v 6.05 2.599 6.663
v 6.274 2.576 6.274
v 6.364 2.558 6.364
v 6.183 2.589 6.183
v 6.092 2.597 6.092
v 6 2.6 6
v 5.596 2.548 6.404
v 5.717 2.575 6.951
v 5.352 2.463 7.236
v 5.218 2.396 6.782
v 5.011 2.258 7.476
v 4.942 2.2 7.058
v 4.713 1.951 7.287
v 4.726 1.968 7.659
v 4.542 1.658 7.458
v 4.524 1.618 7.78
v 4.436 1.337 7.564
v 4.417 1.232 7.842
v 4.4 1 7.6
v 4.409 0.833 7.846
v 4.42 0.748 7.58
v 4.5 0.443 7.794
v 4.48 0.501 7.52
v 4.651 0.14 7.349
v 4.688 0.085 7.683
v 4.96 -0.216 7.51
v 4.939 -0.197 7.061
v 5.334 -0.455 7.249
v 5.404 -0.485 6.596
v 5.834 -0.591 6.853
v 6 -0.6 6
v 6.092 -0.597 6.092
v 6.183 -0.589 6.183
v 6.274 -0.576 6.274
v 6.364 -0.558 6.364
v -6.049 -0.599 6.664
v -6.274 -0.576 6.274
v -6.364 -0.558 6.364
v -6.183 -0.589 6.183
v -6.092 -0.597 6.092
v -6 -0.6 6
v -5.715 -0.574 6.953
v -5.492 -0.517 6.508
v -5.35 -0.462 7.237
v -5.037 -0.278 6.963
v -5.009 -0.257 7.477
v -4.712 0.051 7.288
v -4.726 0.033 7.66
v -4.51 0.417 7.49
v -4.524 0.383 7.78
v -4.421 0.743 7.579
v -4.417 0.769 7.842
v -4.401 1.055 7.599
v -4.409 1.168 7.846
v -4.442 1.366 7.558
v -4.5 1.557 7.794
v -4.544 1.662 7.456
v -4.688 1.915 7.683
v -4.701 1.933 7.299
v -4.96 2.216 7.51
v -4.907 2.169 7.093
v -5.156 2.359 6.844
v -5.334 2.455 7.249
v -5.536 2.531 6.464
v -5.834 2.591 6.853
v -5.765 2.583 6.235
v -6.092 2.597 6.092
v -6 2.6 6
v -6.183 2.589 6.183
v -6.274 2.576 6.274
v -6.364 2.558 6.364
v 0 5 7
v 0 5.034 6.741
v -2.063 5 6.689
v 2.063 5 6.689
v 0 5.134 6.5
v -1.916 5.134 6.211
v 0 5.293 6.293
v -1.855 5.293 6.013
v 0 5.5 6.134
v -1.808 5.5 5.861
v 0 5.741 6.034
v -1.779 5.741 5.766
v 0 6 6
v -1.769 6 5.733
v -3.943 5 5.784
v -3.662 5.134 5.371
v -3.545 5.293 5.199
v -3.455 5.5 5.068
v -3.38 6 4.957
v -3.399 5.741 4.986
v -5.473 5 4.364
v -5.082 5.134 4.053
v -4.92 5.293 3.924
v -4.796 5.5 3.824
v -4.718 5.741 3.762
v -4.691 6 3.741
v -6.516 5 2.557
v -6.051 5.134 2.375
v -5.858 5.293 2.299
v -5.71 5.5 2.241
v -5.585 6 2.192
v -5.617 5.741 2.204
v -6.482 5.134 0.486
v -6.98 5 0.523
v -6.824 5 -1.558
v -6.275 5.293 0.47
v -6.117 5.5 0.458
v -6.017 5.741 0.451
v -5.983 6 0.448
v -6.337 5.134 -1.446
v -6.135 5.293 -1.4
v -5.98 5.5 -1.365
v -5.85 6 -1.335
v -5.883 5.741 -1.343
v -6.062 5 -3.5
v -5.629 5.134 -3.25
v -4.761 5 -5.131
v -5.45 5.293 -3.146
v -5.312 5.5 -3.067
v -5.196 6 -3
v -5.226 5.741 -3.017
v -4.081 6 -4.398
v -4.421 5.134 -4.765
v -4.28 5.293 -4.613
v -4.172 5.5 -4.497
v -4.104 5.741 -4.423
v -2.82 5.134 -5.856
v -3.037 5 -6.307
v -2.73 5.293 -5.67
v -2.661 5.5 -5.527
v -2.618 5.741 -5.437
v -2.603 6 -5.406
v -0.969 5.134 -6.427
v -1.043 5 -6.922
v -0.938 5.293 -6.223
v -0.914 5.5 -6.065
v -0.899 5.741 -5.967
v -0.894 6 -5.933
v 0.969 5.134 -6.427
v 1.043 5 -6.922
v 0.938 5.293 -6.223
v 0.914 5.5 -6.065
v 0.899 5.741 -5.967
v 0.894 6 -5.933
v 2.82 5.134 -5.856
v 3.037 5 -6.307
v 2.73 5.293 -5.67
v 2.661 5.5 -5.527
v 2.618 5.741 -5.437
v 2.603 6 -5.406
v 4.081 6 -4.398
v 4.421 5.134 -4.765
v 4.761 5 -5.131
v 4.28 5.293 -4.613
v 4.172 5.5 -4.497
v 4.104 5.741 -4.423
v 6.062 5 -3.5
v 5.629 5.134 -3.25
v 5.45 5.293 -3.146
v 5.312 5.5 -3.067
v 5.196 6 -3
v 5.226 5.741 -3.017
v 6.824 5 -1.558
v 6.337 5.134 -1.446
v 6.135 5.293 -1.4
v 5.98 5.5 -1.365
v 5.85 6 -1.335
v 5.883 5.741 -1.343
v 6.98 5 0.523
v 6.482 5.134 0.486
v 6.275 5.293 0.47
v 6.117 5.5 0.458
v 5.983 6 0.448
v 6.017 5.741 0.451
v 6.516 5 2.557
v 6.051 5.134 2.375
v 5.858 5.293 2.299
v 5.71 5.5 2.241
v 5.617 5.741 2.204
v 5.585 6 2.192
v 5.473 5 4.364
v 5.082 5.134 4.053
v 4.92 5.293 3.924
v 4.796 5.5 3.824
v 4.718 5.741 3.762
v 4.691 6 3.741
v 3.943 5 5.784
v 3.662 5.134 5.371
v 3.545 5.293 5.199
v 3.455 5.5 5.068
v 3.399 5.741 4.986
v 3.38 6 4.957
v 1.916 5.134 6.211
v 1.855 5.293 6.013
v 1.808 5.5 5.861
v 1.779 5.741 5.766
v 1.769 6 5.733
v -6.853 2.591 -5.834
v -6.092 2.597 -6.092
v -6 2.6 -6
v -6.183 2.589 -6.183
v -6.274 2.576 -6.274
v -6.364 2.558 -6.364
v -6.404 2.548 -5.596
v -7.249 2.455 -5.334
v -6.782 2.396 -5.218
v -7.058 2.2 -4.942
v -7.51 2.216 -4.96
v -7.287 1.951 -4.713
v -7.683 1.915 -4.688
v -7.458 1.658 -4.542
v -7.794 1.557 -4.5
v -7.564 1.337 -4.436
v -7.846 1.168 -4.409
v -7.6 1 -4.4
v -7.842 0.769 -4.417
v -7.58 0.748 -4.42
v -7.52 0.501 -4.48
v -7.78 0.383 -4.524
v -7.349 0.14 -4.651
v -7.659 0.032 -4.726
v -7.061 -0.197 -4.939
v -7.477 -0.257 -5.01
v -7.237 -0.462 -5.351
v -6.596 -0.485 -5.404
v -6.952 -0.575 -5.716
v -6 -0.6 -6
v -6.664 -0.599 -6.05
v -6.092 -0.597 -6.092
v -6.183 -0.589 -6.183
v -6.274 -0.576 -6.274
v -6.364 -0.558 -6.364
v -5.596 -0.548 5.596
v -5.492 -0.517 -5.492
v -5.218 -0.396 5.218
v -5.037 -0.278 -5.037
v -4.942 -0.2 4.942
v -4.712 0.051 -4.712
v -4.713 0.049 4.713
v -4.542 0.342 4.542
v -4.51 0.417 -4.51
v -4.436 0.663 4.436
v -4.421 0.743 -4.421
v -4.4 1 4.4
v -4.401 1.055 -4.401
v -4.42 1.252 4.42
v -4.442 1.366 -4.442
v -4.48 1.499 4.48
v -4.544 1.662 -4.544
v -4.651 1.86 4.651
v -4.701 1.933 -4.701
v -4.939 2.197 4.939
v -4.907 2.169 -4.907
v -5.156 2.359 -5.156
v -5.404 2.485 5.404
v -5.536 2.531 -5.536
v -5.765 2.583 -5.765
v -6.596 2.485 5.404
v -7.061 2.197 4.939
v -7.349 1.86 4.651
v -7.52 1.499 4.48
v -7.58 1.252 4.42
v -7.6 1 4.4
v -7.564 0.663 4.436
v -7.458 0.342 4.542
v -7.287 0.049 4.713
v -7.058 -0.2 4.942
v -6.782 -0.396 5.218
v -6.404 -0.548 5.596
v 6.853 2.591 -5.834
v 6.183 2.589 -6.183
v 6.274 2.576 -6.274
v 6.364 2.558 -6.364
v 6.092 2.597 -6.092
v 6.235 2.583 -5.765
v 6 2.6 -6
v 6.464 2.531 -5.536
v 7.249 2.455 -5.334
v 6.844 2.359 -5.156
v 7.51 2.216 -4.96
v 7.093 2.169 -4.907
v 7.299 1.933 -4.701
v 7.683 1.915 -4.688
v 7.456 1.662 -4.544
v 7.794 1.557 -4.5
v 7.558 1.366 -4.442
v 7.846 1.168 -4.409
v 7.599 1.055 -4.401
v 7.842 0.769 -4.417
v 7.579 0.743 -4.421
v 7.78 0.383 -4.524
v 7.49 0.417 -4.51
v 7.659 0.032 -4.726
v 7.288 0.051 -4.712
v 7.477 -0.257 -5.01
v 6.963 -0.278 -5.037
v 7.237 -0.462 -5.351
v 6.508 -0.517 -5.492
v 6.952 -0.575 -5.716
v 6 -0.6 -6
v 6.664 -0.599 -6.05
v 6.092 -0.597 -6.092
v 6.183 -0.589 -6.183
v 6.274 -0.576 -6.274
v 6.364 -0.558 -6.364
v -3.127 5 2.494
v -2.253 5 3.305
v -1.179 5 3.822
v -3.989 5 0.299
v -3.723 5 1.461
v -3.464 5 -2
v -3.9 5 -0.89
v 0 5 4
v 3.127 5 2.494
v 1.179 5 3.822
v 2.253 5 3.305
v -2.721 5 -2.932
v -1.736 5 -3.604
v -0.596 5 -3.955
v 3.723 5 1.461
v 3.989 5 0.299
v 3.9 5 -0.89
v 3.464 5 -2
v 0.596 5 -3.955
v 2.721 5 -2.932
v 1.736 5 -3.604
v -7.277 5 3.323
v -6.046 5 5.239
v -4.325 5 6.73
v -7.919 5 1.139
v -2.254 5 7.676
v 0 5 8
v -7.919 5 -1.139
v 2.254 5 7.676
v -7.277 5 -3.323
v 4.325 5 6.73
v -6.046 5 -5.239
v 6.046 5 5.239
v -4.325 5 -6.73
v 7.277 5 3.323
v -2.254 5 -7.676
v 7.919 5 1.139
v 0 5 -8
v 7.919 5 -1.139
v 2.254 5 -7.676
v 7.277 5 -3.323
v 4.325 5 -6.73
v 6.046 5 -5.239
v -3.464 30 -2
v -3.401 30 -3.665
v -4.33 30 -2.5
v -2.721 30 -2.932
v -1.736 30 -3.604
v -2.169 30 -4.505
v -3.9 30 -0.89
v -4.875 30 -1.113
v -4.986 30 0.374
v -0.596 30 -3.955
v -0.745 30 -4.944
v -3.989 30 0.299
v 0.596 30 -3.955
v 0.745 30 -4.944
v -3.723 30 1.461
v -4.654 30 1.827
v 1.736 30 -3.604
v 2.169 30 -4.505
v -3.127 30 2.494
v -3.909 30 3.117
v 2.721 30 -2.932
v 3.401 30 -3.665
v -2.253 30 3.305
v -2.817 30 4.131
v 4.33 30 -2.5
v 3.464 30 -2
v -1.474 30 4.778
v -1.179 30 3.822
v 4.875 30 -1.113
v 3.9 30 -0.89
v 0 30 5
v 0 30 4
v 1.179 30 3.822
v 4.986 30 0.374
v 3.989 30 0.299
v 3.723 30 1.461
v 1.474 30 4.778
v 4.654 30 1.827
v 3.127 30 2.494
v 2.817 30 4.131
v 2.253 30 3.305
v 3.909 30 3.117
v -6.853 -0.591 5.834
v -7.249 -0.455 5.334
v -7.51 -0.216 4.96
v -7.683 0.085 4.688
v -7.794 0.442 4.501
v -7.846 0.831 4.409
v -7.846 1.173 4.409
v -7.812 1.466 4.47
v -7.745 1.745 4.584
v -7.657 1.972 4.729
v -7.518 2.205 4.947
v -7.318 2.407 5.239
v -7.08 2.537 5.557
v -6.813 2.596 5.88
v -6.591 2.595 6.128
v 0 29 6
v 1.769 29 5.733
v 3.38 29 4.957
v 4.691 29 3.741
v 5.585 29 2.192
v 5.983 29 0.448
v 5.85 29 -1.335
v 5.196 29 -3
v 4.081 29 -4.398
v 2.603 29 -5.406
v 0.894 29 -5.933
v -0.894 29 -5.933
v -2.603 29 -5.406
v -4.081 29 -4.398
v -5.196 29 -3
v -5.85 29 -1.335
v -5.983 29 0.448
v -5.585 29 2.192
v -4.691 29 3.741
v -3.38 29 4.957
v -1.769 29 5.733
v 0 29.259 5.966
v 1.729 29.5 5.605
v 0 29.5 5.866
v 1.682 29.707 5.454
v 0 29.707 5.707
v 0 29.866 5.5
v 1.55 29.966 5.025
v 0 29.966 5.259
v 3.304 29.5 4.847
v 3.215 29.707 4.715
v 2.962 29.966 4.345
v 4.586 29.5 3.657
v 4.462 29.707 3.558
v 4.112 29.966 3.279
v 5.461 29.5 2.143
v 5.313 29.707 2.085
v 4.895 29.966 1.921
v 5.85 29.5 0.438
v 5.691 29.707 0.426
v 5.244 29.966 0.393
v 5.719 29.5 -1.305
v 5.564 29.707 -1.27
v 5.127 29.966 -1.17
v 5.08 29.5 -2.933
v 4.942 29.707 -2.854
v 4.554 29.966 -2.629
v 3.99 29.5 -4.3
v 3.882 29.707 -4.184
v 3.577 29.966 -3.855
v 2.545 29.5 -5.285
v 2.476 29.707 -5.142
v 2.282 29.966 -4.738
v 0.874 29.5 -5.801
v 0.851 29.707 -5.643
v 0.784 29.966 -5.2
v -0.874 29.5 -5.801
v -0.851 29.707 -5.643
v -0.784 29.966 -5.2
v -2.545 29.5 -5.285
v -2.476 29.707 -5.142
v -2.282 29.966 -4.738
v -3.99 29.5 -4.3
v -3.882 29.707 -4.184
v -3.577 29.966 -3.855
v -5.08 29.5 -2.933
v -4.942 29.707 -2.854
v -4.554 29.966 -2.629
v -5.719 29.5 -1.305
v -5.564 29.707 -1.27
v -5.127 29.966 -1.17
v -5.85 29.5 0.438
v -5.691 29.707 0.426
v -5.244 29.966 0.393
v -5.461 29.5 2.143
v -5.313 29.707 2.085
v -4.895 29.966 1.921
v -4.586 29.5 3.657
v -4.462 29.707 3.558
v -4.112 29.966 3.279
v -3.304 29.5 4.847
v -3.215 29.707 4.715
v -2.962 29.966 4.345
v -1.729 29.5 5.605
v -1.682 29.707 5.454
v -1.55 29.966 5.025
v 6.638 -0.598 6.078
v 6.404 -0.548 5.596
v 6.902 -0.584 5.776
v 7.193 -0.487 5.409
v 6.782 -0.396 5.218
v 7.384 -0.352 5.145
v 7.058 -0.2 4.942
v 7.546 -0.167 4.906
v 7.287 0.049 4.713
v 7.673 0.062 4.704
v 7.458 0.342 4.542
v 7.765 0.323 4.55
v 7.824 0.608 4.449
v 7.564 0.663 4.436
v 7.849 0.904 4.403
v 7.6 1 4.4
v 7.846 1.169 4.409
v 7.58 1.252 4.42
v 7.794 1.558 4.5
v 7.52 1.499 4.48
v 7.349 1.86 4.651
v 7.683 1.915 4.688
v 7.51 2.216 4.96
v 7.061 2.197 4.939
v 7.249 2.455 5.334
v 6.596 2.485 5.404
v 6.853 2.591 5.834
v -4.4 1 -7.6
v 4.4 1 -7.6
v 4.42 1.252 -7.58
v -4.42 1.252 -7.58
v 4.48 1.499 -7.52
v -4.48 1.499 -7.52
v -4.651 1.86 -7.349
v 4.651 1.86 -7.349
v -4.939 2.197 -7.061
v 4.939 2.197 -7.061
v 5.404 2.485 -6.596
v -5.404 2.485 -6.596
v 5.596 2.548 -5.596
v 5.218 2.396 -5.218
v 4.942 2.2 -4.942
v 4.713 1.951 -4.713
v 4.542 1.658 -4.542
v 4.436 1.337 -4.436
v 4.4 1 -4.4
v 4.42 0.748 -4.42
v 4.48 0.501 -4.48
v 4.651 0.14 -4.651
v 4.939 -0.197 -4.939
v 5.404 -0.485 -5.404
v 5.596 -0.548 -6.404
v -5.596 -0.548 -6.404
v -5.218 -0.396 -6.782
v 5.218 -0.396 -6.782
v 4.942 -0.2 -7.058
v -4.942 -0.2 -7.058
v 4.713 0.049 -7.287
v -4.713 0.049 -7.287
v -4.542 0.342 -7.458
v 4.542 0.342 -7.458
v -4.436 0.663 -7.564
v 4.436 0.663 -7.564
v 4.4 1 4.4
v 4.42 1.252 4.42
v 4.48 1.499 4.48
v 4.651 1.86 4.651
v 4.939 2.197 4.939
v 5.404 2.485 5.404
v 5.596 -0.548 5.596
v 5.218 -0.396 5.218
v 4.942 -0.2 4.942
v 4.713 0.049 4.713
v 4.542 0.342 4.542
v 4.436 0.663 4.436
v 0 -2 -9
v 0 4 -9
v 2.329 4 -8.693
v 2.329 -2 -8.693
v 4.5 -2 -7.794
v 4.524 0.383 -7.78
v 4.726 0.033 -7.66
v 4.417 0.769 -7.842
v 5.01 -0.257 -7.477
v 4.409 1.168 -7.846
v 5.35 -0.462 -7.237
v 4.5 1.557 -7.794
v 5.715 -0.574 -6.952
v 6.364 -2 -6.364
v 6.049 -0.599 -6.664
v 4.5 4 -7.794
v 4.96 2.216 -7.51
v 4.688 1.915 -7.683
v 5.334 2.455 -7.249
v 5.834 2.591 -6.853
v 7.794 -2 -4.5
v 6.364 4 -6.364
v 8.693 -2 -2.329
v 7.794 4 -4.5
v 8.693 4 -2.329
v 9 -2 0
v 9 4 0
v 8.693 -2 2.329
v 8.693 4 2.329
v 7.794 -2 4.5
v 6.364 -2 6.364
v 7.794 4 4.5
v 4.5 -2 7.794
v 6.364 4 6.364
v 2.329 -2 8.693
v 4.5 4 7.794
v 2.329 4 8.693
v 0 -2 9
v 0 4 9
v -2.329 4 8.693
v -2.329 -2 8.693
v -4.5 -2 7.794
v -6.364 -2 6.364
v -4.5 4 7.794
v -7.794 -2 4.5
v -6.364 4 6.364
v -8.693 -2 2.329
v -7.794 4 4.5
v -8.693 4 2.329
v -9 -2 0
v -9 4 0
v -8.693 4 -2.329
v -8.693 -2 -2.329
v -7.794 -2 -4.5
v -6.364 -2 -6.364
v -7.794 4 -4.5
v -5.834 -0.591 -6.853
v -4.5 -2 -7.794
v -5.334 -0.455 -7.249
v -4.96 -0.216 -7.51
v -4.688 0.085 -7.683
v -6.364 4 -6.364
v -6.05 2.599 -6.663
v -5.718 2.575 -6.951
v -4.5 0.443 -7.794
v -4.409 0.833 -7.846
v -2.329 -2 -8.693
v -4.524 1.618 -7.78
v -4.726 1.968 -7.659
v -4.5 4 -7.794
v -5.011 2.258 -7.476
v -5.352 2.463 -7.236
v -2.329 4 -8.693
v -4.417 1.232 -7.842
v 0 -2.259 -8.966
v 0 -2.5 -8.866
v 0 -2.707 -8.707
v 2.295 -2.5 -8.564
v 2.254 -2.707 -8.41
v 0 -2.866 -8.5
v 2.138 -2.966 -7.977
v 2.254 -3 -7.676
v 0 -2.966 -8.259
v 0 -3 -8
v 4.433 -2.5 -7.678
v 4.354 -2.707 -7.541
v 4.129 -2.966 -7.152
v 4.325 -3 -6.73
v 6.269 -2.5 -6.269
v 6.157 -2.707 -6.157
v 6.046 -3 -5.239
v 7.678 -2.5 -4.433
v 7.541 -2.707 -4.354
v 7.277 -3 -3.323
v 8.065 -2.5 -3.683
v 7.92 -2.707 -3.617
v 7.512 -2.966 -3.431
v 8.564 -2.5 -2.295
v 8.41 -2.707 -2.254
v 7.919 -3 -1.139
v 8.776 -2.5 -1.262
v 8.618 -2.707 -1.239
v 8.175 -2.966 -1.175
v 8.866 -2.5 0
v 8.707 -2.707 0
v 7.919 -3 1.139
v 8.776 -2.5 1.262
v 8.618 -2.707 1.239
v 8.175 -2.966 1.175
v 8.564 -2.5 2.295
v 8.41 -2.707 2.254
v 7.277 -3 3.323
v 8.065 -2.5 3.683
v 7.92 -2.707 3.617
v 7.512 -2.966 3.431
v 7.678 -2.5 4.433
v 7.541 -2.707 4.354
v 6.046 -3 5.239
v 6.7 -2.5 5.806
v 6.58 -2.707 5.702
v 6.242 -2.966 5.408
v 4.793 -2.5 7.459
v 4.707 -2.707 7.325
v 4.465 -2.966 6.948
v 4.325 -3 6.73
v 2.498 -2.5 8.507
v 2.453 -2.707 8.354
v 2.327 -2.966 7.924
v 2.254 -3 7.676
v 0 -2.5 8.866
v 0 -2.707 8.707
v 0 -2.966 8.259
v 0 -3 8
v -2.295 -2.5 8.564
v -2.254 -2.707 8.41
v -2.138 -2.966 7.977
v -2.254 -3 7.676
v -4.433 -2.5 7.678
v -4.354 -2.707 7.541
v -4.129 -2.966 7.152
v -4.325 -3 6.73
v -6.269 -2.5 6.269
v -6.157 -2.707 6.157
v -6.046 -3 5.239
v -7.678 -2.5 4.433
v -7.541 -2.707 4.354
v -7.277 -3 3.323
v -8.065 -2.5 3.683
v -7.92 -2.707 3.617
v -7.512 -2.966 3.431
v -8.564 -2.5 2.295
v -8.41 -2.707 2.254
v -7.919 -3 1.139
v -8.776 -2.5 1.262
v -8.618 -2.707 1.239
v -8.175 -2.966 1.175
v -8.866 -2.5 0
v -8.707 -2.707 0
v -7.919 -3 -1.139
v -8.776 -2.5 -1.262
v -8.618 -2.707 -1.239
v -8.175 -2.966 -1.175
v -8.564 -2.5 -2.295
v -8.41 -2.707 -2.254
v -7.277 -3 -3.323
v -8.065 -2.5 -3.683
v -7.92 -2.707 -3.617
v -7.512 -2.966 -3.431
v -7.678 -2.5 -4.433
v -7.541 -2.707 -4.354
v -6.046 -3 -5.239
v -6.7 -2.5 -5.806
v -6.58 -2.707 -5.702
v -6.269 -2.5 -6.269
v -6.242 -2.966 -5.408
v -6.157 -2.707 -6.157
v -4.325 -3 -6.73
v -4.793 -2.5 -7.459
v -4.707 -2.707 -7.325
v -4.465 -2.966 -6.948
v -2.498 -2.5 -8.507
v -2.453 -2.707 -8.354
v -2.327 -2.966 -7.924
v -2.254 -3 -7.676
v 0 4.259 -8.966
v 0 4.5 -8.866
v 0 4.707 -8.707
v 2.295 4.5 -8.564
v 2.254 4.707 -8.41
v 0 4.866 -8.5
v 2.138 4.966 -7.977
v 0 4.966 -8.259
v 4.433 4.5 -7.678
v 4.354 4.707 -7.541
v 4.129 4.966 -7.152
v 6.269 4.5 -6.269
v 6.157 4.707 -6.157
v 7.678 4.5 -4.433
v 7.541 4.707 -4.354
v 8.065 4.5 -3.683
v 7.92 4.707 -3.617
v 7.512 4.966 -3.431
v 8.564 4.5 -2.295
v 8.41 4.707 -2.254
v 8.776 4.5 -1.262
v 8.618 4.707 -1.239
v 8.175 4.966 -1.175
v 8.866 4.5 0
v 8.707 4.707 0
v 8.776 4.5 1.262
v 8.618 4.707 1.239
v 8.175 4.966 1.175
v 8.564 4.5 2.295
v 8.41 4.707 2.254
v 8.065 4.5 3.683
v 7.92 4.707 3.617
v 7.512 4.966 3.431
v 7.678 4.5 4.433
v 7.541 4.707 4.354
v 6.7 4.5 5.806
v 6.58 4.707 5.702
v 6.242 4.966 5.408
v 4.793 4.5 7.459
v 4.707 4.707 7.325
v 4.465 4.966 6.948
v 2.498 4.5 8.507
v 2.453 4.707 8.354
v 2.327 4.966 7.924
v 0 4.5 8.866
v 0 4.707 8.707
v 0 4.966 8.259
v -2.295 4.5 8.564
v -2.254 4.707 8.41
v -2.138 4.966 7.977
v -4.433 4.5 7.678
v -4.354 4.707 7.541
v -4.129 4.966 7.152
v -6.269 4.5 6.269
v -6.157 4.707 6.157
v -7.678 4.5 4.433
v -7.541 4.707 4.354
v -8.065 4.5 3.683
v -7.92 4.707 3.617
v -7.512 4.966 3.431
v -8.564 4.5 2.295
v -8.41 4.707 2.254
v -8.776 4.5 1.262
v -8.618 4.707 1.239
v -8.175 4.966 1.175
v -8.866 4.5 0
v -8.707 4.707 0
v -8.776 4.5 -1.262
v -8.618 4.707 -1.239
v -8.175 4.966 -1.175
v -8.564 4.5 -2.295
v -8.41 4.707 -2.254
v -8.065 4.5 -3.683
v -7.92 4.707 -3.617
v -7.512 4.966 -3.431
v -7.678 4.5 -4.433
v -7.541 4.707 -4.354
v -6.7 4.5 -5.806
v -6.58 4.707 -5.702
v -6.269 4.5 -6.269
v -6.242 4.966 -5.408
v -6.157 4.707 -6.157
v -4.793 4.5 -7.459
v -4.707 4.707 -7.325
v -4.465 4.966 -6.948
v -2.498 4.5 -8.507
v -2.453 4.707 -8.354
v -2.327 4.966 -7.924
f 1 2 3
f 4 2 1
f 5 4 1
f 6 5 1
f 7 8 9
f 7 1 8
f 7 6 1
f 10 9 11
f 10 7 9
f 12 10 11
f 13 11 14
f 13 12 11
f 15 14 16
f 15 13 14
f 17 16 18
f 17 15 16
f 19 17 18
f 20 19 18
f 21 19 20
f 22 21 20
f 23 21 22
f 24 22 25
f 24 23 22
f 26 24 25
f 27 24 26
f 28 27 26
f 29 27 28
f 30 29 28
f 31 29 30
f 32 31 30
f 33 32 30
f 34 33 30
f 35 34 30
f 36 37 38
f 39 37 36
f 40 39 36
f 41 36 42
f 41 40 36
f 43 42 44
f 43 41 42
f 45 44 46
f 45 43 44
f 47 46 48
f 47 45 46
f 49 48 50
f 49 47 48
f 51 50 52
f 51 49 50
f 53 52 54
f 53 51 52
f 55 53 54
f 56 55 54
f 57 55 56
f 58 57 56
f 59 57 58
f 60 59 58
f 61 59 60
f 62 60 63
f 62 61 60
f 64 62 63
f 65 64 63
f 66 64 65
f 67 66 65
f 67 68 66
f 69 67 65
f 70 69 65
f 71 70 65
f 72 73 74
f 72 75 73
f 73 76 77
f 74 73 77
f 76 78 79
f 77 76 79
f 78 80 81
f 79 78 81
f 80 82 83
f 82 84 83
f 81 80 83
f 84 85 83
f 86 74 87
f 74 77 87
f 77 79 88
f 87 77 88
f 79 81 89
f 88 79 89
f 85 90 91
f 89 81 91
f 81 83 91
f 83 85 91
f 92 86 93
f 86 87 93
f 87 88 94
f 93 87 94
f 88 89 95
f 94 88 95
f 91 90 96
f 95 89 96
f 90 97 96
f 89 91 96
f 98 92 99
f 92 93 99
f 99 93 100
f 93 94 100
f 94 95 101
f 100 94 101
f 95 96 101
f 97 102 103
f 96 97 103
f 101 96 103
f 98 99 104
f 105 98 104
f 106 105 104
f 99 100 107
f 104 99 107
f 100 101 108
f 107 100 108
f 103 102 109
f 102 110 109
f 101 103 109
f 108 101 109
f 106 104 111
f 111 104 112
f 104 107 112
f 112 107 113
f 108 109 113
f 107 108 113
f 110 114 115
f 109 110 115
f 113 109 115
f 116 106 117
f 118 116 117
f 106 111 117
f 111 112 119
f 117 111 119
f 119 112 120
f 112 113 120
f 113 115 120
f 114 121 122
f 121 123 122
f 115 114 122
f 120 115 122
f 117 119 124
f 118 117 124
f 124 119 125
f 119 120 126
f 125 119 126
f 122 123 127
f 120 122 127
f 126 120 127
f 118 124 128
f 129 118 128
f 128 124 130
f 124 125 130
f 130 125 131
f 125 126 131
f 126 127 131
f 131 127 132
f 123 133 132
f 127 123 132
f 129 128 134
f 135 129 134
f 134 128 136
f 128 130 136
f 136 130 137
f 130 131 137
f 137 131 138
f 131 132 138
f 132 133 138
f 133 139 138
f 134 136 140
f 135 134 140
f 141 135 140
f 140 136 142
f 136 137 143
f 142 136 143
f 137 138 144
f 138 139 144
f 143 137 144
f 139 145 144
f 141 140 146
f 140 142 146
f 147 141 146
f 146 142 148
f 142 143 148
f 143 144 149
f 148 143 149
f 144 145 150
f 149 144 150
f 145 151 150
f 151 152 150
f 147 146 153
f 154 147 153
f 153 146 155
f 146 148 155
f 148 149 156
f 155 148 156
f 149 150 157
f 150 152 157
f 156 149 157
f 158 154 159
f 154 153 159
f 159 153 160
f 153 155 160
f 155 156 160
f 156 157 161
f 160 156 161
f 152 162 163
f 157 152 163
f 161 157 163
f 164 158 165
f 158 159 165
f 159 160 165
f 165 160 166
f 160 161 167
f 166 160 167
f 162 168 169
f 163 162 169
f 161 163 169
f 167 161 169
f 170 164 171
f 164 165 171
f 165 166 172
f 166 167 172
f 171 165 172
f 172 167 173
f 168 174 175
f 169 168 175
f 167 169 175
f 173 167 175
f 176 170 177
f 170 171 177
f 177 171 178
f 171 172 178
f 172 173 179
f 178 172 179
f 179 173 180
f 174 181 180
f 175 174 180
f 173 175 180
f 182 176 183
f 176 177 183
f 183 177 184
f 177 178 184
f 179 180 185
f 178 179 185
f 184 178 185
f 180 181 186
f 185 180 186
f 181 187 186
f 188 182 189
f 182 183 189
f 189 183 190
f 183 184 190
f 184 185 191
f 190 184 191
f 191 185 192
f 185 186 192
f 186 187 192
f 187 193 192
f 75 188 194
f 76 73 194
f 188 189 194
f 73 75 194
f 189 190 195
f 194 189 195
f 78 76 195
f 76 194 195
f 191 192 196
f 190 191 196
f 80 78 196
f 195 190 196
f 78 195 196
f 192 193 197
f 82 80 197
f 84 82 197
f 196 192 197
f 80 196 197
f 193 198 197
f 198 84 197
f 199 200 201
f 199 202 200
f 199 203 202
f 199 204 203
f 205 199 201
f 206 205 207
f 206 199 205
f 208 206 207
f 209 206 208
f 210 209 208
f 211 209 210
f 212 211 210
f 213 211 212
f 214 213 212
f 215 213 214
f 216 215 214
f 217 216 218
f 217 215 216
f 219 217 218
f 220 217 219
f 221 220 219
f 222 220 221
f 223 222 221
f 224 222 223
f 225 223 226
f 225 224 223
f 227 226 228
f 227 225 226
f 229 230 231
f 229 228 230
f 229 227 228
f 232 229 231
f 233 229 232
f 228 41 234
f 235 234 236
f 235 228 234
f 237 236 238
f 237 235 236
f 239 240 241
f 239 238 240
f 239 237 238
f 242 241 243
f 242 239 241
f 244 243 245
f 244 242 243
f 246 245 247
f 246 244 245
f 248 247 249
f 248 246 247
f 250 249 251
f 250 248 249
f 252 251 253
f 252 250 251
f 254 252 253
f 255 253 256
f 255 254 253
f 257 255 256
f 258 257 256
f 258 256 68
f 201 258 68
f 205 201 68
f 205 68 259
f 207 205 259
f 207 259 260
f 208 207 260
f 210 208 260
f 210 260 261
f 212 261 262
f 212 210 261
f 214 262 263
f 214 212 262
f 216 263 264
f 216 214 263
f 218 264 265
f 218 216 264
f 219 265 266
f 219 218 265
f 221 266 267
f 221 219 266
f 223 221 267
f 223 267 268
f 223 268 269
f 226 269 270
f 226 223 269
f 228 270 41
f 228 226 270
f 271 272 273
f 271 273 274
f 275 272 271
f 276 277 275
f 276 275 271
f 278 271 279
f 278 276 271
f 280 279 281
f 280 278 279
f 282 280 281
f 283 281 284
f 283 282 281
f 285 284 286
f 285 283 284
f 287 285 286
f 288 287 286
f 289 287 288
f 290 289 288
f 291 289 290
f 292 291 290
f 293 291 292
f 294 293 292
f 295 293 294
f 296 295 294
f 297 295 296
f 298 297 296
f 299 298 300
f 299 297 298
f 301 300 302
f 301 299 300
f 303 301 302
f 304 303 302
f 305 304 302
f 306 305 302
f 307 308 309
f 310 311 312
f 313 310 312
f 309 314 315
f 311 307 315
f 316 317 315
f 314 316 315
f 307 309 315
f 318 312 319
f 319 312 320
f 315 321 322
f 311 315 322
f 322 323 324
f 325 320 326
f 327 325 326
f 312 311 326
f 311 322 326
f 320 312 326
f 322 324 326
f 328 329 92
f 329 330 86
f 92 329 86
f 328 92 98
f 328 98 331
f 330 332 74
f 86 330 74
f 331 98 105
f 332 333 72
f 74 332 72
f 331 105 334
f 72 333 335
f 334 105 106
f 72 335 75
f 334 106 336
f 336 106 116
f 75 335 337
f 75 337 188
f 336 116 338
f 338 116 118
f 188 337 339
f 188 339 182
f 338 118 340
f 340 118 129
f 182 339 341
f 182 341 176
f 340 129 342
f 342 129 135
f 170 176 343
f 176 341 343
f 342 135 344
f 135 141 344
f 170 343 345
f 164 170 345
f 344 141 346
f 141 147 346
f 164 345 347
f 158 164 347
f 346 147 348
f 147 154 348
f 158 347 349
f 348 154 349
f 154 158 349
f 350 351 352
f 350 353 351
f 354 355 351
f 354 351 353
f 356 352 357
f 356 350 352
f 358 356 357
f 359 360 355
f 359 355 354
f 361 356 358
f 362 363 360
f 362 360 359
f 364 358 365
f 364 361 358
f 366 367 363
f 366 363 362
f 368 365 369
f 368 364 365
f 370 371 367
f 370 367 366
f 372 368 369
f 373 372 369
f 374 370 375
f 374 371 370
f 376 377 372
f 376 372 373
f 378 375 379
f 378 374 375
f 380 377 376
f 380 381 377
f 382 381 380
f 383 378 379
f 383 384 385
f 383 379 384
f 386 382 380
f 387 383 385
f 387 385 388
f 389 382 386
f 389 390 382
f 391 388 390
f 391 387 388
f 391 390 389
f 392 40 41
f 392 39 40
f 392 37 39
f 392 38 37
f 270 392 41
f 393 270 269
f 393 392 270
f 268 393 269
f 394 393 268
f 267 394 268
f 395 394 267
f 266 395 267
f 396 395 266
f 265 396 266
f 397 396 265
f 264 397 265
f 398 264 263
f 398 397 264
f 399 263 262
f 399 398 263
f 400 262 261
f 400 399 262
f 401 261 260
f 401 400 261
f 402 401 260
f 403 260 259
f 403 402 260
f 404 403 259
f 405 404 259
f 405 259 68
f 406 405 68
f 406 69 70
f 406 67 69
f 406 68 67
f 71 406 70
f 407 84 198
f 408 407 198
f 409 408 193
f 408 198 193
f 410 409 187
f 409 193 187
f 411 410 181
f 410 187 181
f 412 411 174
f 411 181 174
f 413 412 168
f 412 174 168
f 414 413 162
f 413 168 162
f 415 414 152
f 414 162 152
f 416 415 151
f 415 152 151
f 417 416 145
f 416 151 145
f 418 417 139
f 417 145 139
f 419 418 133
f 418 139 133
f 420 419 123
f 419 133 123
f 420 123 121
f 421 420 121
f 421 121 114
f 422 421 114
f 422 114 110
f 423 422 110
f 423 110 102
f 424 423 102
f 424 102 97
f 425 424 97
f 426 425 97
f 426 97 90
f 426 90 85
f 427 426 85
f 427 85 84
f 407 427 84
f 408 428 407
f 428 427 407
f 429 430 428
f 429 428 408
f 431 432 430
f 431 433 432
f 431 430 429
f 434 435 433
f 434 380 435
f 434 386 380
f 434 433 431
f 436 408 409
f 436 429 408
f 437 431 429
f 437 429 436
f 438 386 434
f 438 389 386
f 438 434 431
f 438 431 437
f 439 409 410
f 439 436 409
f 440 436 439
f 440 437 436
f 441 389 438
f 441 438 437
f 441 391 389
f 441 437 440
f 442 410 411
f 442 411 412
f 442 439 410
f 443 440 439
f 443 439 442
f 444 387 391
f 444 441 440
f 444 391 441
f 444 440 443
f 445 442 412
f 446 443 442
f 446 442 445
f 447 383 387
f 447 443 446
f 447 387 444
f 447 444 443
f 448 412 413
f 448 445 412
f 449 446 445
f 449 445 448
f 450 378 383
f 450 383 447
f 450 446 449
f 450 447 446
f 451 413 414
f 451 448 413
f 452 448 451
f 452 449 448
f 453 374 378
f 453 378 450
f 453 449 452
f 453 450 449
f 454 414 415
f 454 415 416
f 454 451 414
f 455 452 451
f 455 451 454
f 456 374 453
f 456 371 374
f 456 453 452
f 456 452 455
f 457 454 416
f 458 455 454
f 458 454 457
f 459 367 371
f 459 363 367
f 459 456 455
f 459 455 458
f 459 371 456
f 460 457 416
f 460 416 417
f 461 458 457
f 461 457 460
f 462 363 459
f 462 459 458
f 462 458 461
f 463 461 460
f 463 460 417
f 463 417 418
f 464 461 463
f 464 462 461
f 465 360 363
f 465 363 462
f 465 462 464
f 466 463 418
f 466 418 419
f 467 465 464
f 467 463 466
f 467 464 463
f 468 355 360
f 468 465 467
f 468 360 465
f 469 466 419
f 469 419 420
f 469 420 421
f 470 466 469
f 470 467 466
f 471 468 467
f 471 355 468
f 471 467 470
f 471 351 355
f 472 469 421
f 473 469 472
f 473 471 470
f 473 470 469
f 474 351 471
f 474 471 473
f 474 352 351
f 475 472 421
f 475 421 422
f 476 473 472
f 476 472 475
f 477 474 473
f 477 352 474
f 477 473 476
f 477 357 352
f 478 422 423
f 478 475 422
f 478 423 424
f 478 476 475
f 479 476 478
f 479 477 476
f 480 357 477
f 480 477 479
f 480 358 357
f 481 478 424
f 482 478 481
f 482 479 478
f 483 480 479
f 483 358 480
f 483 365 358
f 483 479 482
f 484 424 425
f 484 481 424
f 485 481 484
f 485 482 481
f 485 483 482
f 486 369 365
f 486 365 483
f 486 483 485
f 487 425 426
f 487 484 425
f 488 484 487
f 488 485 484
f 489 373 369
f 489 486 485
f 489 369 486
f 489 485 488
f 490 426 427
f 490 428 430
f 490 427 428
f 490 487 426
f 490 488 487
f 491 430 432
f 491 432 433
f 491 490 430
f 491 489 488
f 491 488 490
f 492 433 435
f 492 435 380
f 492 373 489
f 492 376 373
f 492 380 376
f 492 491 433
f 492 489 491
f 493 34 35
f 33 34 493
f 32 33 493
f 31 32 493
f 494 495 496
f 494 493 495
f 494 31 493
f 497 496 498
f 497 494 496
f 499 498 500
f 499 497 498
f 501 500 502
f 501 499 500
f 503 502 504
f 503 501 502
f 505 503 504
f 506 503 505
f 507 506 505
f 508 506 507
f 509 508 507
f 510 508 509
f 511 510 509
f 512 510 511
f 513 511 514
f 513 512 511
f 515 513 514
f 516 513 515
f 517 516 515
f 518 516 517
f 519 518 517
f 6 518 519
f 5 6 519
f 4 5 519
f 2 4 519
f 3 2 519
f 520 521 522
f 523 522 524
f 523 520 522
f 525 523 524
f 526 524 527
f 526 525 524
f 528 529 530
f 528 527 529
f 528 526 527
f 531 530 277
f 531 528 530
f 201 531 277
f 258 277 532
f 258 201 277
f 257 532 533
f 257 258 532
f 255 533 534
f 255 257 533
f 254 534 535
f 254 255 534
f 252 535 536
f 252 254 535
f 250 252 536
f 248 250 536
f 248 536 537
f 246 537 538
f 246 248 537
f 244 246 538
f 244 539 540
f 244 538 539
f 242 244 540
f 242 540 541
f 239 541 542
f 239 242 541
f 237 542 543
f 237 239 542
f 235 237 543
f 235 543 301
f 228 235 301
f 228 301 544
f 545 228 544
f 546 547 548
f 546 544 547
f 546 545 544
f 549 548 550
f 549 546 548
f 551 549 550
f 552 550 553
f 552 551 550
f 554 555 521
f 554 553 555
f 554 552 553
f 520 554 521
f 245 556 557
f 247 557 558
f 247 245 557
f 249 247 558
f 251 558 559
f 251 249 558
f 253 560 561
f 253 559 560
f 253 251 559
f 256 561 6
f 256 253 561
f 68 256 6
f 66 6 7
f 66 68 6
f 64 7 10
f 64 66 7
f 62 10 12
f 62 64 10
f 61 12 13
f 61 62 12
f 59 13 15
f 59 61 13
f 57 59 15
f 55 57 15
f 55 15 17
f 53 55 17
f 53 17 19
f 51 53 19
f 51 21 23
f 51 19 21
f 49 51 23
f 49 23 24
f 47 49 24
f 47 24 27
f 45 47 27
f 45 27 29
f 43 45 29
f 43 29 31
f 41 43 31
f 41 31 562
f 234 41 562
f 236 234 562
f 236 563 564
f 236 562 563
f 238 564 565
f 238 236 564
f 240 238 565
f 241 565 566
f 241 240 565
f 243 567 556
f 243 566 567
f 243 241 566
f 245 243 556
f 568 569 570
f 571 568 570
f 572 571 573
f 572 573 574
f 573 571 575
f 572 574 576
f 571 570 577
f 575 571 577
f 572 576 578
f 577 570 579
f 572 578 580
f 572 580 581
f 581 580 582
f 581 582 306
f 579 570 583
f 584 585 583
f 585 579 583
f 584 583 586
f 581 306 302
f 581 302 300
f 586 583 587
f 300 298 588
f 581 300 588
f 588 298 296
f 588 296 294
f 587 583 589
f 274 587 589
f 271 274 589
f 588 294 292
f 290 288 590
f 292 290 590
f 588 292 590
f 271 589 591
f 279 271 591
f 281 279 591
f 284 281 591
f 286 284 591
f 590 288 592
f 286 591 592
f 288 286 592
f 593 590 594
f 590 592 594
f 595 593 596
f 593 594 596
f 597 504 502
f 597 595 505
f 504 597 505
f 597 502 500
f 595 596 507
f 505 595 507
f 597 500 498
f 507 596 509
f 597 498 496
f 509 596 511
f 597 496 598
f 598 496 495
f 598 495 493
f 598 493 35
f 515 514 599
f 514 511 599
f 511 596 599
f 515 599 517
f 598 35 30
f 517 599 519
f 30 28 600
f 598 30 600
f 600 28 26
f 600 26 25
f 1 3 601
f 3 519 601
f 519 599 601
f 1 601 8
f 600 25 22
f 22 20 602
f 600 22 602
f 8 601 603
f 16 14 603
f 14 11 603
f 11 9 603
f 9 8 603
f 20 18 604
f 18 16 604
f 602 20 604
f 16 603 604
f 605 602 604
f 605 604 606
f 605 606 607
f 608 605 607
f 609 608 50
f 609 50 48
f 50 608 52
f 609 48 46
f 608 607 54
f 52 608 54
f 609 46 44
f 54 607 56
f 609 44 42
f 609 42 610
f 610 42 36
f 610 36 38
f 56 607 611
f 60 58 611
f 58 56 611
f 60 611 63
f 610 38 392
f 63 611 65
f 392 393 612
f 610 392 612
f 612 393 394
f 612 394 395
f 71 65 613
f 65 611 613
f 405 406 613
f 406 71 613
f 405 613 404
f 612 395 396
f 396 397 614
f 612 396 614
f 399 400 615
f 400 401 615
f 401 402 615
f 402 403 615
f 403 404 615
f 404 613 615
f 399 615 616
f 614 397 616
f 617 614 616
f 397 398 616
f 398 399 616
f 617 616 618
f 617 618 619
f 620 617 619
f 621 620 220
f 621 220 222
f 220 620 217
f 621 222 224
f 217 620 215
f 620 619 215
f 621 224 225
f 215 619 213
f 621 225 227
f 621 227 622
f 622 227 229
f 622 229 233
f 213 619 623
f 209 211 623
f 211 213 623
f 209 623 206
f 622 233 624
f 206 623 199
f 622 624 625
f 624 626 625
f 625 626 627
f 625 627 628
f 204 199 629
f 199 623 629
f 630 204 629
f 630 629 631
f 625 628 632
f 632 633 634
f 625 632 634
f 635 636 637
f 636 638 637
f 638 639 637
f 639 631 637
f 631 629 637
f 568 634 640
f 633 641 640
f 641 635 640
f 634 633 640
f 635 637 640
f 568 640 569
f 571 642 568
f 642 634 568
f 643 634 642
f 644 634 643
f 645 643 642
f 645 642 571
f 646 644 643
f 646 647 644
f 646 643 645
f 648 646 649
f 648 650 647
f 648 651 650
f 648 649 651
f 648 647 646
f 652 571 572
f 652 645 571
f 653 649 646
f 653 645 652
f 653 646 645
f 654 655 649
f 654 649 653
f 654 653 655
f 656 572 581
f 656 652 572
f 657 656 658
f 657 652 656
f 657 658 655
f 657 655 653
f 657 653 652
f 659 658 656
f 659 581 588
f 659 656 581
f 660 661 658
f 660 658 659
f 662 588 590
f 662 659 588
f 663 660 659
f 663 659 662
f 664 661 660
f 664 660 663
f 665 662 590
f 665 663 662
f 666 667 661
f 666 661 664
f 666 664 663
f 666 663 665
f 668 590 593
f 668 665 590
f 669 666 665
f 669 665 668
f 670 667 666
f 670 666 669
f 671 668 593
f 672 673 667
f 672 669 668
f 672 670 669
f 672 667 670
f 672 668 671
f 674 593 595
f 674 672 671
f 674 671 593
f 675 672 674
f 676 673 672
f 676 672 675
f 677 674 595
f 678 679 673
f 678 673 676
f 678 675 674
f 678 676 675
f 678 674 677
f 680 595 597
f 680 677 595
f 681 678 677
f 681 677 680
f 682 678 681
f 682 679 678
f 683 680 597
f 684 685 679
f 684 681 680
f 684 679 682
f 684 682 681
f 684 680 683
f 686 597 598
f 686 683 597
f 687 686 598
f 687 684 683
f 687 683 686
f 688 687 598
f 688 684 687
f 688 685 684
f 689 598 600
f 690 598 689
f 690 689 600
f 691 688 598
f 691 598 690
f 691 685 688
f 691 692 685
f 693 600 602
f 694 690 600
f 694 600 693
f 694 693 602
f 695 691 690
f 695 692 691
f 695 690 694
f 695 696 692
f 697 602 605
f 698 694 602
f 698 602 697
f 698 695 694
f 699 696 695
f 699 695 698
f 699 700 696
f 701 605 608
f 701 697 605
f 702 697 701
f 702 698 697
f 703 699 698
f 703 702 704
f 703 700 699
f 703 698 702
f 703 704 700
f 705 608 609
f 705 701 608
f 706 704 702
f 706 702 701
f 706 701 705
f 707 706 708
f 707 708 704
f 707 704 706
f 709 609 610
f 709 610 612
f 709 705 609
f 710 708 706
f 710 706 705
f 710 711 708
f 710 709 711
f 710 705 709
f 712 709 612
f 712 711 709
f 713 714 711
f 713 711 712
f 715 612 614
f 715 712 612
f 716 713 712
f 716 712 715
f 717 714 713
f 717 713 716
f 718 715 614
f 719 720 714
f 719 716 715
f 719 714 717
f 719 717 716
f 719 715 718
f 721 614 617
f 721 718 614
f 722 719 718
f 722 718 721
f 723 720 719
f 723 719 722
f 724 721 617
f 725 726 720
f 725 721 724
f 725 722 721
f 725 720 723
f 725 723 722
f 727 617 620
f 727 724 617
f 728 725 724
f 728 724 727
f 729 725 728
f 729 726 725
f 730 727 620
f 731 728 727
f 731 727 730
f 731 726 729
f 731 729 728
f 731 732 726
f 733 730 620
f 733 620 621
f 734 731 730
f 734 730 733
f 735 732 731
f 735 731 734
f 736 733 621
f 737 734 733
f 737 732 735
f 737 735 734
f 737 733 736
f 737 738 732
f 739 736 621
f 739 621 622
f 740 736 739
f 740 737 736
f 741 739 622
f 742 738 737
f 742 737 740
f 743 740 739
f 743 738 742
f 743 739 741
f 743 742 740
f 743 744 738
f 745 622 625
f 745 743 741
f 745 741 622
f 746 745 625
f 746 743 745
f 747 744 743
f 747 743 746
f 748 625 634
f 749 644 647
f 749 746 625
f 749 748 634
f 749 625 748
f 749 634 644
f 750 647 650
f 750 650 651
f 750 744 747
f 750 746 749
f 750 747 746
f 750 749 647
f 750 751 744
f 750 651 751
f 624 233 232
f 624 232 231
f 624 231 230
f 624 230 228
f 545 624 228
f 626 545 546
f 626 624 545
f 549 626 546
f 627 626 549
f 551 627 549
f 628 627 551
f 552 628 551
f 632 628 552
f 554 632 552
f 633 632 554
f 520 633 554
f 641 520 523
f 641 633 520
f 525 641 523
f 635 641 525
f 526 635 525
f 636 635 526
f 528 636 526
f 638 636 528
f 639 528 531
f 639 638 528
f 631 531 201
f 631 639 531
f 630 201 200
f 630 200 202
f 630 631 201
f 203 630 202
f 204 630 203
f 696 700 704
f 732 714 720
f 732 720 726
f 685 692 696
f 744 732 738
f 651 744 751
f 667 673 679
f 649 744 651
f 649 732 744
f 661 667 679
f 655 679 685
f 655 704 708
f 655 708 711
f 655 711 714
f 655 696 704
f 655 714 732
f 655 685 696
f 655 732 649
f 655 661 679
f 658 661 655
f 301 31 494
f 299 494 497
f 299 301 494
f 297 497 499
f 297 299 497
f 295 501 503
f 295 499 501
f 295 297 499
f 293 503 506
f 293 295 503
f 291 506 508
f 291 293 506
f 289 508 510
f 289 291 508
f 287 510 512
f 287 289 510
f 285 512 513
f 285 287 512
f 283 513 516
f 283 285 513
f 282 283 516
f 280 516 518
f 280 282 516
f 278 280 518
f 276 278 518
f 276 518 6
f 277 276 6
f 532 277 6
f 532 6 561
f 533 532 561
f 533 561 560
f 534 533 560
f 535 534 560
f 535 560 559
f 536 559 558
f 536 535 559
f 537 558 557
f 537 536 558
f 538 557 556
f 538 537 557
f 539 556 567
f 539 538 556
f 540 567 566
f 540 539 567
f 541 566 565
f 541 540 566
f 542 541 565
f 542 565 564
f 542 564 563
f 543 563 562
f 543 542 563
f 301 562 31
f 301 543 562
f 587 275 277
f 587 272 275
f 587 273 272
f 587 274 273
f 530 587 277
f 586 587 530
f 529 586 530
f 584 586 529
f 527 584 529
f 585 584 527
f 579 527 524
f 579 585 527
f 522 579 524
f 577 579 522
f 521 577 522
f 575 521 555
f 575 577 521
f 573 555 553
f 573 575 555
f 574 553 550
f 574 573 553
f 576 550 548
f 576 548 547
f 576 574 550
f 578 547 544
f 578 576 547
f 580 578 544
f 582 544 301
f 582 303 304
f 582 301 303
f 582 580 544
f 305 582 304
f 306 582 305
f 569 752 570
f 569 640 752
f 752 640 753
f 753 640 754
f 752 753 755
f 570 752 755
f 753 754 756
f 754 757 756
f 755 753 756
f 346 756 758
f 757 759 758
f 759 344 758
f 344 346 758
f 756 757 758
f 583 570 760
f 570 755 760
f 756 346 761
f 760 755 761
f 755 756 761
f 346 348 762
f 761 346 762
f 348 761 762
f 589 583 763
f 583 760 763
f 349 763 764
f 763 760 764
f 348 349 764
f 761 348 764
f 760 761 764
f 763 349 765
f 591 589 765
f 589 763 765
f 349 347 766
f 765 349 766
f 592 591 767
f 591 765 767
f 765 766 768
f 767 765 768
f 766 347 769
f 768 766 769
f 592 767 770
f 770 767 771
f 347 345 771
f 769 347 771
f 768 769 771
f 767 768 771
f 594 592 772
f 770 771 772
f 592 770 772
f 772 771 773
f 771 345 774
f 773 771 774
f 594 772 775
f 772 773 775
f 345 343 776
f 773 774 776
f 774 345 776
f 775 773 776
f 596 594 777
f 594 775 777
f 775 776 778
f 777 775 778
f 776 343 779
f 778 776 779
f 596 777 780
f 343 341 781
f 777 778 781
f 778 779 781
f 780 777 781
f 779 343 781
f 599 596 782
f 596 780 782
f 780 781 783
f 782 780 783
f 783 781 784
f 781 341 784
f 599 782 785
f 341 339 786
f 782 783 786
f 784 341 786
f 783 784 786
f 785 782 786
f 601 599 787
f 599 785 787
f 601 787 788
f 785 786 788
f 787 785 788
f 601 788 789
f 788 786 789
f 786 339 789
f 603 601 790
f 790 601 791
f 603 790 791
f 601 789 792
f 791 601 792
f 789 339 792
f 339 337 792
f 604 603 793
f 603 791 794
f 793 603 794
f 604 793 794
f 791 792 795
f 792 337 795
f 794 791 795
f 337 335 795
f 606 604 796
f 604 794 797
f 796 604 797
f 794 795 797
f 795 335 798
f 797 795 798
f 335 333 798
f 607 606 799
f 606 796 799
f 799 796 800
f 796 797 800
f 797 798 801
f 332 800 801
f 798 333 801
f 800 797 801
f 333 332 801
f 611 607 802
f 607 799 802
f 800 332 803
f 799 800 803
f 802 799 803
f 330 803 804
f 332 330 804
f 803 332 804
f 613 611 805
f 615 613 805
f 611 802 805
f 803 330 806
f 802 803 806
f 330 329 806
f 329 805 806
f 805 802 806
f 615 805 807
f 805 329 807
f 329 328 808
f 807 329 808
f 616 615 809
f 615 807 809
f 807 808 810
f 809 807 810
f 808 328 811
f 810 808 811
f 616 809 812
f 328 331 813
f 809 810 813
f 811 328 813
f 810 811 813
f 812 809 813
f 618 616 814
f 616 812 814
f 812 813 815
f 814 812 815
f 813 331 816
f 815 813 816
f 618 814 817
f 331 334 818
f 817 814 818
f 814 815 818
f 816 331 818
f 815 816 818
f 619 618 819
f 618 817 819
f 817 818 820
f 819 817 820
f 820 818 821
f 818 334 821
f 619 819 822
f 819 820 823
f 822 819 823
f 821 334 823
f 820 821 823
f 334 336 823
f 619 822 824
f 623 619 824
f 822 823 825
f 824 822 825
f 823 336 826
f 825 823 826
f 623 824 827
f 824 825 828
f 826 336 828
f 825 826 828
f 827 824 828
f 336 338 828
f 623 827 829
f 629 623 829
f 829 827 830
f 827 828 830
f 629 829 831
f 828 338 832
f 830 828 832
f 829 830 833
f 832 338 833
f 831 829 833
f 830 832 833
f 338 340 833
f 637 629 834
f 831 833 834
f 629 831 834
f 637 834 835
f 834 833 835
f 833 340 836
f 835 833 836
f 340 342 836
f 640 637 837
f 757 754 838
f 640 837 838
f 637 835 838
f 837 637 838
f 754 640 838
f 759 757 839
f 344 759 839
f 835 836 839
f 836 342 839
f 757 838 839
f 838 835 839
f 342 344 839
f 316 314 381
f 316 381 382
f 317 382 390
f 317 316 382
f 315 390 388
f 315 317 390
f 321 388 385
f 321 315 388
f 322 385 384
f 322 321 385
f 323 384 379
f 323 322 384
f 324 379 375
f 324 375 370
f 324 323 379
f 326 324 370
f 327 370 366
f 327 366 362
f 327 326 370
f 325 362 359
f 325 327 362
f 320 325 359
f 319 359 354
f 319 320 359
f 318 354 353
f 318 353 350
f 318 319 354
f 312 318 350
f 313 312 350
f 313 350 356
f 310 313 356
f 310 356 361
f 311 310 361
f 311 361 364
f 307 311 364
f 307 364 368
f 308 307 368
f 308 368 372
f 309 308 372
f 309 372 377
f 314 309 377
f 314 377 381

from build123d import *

# Parameters (mm, degrees)
SKETCH_1_R               = 6
SKETCH_1_R_2             = 4
EXTRUDE_1_DEPTH          = 30
EXTRUDE_2_DEPTH          = 3
EXTRUDE_2_DEPTH_BACK     = 5
SKETCH_2_R               = 9
CUT_EXTRUDE_1_DEPTH      = 33.588341474
CUT_EXTRUDE_1_DEPTH_BACK = 33.588341474
SKETCH_3_R               = 1.6
CUT_EXTRUDE_2_DEPTH      = 33.588341529
CUT_EXTRUDE_2_DEPTH_BACK = 33.588341529
SKETCH_4_R               = 1.6
FILLET_1_R               = 1


with BuildPart() as part:
    # 草图1 → 凸台-拉伸1 (new body)
    with BuildSketch(Plane(origin=(0, 0, 0), x_dir=(1, 0, 0), z_dir=(0, 1, 0))):
        with Locations(Location((0, 0, 0), (0, 0, 270))):
            Circle(SKETCH_1_R)
        with Locations(Location((0, 0, 0), (0, 0, 270))):
            Circle(SKETCH_1_R_2, mode=Mode.SUBTRACT)
    extrude(amount=EXTRUDE_1_DEPTH)

    # 草图2 → 凸台-拉伸2 (add, two sides: drawn at the far end of the back side and taken through both)
    with BuildSketch(Plane.XZ.offset(-EXTRUDE_2_DEPTH_BACK)):
        with Locations(Location((0, 0, 0), (0, 0, 270))):
            Circle(SKETCH_2_R)
    extrude(amount=EXTRUDE_2_DEPTH + EXTRUDE_2_DEPTH_BACK)

    # 草图3 → 切除-拉伸1 (cut, two sides: drawn at the far end of the back side and taken through both)
    with BuildSketch(Plane(origin=(0, 0, 0), x_dir=(0, 0, -1), z_dir=(1, 0, 0)).offset(-CUT_EXTRUDE_1_DEPTH_BACK)):
        with Locations((-6, 1)):
            Circle(SKETCH_3_R)
        with Locations((6, 1)):
            Circle(SKETCH_3_R)
    extrude(amount=CUT_EXTRUDE_1_DEPTH + CUT_EXTRUDE_1_DEPTH_BACK, mode=Mode.SUBTRACT)

    # 草图4 → 切除-拉伸2 (cut, two sides: drawn at the far end of the back side and taken through both)
    with BuildSketch(Plane.XY.offset(-CUT_EXTRUDE_2_DEPTH_BACK)):
        with Locations(Location((-6, 1, 0), (0, 0, 270))):
            Circle(SKETCH_4_R)
        with Locations(Location((6, 1, 0), (0, 0, 270))):
            Circle(SKETCH_4_R)
    extrude(amount=CUT_EXTRUDE_2_DEPTH + CUT_EXTRUDE_2_DEPTH_BACK, mode=Mode.SUBTRACT)

    # 圆角1
    fillet_1_edges = [part.edges().sort_by_distance(p)[0] for p in [
        (0, 5, -6),
        (0, 5, 9),
        (0, -3, 9),
        (0, 30, -6),
    ]]
    fillet(fillet_1_edges, radius=FILLET_1_R)


solid = part.part
